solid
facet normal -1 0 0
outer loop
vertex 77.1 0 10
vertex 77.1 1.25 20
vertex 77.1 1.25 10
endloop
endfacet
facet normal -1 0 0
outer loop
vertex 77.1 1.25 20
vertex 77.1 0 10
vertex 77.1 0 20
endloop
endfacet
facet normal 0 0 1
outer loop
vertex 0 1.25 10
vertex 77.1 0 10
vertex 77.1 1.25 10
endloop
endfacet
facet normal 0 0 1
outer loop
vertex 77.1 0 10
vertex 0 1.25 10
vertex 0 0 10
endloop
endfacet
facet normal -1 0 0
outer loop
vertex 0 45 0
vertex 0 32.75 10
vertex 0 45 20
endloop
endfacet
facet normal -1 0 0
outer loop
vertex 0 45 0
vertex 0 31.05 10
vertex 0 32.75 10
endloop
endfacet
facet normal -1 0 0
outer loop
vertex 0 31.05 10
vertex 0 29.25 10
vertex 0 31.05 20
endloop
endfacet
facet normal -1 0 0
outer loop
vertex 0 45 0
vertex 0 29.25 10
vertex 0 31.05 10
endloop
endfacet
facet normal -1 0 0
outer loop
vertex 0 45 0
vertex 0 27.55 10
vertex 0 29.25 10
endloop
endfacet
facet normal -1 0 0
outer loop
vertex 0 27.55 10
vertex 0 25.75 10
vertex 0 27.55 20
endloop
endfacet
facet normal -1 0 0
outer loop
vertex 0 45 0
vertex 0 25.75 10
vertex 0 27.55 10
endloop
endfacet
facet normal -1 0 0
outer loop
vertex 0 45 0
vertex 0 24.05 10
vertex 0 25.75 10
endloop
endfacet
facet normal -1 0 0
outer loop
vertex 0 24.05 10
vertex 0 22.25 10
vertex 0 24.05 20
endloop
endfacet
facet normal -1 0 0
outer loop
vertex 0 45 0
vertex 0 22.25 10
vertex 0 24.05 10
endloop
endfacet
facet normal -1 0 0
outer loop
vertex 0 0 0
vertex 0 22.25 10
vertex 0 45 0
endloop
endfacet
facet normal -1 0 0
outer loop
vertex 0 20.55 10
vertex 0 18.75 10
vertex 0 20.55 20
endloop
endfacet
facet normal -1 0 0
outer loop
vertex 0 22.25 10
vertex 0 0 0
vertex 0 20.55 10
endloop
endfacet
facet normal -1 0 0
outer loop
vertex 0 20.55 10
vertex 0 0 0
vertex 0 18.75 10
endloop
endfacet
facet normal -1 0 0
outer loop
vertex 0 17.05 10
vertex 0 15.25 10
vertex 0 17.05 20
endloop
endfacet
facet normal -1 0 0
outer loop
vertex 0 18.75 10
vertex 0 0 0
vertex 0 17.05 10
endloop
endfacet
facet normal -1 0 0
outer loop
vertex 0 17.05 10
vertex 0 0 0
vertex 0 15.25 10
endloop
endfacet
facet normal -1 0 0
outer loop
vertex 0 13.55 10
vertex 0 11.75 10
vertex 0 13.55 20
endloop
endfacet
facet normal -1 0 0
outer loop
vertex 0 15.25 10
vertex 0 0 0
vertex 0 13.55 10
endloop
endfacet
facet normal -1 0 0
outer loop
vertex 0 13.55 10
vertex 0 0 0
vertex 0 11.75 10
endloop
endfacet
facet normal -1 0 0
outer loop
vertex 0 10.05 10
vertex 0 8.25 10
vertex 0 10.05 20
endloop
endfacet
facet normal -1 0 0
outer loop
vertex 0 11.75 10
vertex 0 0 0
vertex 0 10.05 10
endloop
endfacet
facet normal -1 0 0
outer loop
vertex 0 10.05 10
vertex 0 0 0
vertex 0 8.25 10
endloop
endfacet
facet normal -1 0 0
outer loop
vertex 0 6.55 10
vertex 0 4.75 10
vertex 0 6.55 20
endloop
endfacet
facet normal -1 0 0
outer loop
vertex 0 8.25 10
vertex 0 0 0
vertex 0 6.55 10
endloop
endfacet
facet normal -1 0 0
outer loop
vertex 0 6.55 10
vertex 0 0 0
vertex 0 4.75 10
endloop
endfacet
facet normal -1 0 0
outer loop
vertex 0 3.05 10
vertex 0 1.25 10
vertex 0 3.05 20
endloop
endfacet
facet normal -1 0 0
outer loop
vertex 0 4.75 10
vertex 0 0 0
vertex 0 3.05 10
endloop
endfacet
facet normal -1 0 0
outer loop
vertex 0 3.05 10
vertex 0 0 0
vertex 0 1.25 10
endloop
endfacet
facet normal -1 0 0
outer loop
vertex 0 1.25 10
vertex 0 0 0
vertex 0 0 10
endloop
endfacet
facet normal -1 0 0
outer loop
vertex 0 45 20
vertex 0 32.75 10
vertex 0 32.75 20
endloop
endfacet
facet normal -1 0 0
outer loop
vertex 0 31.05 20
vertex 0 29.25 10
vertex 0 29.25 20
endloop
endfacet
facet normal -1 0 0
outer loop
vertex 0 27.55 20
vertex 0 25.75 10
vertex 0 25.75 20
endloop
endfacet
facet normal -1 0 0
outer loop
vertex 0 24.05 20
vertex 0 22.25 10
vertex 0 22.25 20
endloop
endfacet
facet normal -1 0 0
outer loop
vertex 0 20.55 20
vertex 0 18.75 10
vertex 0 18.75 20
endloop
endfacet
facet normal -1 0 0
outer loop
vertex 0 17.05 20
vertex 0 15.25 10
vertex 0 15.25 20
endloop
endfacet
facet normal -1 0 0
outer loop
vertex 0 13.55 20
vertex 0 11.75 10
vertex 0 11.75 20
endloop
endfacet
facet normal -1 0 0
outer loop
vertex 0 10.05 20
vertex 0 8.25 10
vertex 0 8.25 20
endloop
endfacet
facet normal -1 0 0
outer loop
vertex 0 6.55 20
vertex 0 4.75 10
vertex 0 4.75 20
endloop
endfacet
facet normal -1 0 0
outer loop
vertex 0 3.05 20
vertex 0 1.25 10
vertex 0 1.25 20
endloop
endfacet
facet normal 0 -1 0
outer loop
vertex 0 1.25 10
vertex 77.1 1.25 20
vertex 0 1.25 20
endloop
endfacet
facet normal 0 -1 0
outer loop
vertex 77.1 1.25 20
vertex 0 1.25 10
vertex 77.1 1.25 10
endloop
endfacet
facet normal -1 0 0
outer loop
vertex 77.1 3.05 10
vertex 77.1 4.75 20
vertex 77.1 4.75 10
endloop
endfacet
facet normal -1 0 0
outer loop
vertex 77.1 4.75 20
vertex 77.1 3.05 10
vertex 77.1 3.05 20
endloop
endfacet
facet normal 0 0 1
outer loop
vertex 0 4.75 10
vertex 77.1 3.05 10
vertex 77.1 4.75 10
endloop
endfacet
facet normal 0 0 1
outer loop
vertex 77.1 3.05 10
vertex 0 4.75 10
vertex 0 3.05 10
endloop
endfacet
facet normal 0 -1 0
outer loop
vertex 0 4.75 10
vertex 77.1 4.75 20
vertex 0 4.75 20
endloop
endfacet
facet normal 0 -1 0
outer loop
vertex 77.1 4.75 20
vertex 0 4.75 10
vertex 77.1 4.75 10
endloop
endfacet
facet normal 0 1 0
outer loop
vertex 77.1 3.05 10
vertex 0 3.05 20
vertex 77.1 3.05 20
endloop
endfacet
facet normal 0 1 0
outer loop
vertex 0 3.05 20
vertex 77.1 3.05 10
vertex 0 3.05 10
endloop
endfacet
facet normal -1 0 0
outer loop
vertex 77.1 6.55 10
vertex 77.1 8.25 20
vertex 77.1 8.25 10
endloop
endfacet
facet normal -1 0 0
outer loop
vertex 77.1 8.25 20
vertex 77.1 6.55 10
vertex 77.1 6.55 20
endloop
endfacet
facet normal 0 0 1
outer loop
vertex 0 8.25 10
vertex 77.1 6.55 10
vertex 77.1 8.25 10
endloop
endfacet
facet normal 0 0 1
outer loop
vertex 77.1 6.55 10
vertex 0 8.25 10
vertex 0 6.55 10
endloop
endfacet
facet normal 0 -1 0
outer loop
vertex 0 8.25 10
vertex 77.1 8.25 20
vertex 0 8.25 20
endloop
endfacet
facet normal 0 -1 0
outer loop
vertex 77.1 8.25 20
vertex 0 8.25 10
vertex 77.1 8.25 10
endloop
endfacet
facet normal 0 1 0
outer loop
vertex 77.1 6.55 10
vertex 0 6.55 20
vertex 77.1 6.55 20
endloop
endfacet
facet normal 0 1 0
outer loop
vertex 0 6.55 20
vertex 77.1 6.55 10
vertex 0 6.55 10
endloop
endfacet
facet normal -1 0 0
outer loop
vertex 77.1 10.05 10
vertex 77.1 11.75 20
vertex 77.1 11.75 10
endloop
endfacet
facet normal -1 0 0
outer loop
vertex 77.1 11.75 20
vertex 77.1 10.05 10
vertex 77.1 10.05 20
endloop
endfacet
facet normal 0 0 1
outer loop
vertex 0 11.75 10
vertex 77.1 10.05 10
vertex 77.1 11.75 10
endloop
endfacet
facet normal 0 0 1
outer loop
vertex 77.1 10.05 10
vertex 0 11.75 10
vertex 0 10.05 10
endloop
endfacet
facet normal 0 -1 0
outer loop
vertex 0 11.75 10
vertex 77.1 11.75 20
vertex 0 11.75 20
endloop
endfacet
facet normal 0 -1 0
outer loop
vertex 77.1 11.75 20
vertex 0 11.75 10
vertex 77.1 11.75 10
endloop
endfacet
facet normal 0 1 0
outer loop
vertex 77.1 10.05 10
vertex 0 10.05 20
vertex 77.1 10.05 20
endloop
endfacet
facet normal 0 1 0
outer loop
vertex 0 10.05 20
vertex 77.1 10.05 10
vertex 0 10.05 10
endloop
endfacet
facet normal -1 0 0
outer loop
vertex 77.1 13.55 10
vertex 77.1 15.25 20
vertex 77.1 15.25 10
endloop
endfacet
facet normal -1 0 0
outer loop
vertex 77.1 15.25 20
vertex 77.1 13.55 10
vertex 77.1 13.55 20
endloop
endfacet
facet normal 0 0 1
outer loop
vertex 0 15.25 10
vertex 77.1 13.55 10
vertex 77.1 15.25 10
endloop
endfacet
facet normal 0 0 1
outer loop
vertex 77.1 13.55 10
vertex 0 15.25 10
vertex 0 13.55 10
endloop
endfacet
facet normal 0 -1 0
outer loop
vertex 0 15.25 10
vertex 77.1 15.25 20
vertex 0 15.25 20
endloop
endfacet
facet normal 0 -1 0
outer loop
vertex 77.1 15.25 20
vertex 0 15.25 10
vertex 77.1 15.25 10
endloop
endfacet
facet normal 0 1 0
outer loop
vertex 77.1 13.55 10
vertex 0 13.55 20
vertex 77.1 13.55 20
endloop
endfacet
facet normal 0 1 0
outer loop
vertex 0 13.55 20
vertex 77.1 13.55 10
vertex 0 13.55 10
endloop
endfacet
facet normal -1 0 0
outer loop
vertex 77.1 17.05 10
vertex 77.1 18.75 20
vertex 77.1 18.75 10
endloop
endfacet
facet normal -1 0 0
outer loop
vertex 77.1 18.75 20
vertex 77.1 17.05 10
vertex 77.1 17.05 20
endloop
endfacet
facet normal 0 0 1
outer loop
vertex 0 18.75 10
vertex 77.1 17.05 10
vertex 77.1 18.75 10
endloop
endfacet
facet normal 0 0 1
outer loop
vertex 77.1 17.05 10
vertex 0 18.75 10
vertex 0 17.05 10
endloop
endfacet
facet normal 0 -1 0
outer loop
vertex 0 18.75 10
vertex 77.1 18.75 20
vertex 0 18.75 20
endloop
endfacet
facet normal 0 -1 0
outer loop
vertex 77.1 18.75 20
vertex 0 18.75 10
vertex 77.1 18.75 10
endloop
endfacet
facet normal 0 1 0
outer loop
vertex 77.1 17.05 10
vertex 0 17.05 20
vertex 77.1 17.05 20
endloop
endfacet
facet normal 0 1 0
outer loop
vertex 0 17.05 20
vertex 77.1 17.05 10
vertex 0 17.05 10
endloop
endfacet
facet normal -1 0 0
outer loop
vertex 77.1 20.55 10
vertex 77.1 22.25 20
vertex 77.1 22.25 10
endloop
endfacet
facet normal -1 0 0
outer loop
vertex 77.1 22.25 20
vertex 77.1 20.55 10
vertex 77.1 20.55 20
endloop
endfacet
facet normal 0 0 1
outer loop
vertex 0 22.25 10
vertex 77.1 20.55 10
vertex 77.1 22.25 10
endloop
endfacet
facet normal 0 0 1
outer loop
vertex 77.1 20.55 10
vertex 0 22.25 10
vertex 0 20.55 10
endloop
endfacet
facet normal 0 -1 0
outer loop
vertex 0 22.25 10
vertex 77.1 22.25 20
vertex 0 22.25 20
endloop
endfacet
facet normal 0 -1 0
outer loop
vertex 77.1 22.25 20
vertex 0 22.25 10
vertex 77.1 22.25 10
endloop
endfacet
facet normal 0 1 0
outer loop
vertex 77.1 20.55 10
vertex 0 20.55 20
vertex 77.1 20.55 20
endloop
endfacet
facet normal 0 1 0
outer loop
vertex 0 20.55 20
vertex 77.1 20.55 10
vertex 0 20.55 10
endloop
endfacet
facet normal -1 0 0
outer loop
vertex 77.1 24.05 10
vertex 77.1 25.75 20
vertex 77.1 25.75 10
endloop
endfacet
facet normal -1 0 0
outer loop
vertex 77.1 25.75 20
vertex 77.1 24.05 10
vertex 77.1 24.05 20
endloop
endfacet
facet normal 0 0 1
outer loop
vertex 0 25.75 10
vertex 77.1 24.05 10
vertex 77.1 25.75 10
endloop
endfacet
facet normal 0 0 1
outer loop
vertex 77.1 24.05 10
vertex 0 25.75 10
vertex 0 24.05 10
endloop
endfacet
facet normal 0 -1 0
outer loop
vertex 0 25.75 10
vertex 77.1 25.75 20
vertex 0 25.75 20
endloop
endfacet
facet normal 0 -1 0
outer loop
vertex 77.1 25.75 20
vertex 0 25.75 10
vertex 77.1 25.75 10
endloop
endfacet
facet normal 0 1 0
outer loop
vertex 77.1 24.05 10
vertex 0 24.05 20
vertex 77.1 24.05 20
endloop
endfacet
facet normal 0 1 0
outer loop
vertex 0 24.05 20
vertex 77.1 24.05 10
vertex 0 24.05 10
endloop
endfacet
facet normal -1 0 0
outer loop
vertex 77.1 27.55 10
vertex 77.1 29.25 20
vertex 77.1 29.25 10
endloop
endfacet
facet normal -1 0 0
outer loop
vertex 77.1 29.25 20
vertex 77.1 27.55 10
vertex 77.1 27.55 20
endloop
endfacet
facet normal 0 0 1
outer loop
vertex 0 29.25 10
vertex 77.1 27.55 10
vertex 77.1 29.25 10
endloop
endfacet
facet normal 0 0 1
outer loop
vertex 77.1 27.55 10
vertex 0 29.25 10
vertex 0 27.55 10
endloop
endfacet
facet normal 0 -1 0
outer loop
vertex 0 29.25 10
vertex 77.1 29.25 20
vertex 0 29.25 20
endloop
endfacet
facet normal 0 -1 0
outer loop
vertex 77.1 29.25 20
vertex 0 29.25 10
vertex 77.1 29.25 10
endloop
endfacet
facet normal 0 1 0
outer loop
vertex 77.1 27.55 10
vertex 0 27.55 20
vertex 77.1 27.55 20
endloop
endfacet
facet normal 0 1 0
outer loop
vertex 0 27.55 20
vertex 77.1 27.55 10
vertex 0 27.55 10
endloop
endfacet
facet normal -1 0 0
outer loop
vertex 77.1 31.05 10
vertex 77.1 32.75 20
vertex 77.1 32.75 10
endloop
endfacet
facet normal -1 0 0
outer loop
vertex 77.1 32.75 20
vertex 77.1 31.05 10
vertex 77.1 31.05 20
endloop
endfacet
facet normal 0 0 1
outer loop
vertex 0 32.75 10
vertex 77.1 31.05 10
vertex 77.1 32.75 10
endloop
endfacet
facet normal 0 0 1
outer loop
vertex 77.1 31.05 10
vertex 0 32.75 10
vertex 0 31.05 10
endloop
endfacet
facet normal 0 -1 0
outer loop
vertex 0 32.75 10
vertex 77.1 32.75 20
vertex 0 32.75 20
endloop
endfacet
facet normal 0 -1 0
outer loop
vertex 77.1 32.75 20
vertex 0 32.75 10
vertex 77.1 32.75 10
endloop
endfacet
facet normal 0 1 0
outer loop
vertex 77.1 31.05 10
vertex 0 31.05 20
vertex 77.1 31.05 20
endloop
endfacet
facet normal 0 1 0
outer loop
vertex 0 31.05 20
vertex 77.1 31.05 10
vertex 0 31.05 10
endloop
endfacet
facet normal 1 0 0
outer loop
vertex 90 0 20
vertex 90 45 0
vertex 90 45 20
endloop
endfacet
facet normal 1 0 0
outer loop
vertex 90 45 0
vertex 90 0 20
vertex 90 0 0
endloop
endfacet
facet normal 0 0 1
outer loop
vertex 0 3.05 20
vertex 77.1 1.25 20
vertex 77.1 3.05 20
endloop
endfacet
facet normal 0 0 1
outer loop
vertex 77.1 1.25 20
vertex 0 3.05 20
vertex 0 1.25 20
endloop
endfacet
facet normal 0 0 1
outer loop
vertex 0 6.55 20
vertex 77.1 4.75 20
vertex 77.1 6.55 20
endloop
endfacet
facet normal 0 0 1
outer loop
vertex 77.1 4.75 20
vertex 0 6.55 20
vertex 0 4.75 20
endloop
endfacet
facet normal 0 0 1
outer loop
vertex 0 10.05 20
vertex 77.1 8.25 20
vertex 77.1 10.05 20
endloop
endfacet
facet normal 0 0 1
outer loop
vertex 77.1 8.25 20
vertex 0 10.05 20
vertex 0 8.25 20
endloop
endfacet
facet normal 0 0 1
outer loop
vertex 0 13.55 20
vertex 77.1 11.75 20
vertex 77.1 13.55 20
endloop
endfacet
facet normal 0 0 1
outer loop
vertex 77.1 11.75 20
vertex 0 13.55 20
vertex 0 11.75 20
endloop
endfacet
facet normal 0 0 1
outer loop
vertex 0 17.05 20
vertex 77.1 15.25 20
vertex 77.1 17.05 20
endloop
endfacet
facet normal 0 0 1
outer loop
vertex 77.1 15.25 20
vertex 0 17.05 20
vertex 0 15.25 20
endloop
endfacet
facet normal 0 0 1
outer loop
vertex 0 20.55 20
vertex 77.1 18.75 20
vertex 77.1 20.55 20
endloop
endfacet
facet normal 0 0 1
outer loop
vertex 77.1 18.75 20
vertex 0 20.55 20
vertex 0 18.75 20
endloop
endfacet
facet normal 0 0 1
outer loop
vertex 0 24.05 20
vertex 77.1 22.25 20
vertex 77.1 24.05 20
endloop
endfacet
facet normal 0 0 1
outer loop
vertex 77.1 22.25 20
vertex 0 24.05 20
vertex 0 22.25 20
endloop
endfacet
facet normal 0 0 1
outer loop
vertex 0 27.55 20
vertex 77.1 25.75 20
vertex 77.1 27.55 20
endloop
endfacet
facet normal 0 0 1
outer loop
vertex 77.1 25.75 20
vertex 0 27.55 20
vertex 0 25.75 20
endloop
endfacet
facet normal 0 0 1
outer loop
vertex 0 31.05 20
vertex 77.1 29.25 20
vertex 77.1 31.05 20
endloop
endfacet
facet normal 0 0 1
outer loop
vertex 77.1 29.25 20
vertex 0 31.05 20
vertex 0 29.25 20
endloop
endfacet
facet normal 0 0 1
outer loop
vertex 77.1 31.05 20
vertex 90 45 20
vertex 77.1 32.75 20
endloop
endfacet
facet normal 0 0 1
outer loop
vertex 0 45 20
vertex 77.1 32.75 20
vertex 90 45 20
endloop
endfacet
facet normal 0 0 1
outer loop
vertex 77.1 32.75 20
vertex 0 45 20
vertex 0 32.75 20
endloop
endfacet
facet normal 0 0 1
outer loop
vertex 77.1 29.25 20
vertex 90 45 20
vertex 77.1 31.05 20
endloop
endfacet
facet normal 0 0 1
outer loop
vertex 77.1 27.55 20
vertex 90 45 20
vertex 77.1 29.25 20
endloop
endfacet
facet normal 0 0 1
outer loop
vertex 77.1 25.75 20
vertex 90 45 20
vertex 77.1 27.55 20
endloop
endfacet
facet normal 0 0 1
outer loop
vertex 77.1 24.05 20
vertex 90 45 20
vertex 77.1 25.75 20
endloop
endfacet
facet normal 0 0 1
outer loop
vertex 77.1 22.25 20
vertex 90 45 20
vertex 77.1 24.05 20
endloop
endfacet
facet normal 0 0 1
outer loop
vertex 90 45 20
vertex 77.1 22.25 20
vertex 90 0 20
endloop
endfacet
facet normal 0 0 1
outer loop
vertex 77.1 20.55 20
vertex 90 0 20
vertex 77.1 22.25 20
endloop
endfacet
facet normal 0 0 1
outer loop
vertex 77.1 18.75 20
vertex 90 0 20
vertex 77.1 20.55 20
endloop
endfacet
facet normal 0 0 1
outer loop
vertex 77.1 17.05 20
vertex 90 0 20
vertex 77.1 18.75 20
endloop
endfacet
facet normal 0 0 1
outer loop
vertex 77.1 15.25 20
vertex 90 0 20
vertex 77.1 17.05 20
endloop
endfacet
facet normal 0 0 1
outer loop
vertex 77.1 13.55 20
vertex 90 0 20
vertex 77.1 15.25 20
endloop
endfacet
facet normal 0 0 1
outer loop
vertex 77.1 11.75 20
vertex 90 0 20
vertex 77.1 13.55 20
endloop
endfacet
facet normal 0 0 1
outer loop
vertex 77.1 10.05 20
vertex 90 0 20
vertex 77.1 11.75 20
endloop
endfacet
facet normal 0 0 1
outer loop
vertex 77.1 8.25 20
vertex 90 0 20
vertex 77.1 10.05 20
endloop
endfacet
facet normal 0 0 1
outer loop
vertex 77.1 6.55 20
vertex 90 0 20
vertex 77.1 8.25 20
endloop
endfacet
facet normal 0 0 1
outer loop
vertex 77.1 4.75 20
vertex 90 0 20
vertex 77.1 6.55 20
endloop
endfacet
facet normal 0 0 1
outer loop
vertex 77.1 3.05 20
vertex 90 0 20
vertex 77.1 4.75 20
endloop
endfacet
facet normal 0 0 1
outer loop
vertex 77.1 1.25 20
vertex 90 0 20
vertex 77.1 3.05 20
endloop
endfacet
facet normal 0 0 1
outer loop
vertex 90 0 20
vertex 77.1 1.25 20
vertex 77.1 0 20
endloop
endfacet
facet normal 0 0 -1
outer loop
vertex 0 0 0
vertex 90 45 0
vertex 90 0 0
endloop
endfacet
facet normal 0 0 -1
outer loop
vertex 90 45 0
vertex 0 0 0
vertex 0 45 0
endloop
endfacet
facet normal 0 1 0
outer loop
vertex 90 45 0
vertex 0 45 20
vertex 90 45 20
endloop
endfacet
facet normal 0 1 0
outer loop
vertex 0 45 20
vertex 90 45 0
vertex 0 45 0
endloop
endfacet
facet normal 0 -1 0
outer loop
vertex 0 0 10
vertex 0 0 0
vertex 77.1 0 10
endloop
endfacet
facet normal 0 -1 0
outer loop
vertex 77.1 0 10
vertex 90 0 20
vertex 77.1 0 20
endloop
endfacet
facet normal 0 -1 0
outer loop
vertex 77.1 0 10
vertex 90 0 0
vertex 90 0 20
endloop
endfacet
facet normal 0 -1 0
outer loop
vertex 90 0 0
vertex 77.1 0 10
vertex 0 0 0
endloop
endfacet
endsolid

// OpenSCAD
// Drying Rack for 10 Microscope Slides
// Base: 90 x 45 x 20 mm
// Slots: 10 parallel slots along X, 77mm long, 1.6mm wide, 10mm deep
// Spacing: 3.5mm centre-to-centre in Y, centred on block

$fn = 128;

// Base Dimensions
base_length = 90;
base_width = 45;
base_height = 20;

// Slide Dimensions (for reference)
slide_length = 75;
slide_width = 25;
slide_thickness = 1;

// Slot Dimensions
slot_length = 77;
slot_width = 1.6;
slot_depth = 10;

// Layout Dimensions
slot_spacing = 3.5; // Centre-to-centre in Y
num_slots = 10;

// Calculate Y position of the first slot centre
// Total width of slots = num_slots * slot_width
// Total width of gaps = (num_slots - 1) * slot_spacing
// Remaining space to distribute on both sides = (base_width - total_slots - total_gaps) / 2
total_slot_width = num_slots * slot_width;
total_gap_width = (num_slots - 1) * slot_spacing;
offset_from_edge = (base_width - total_slot_width - total_gap_width) / 2;
first_slot_y = offset_from_edge + slot_width / 2;

// Build the solid block
difference() {
    // Main Block
    cube([base_length, base_width, base_height], center = false);
    
    // Cut Slots
    // Slots run along X, so we cut from the top face (Z = base_height) down to Z = base_height - slot_depth
    // We use a loop to generate the 10 slots
    for (i = [0 : num_slots - 1]) {
        // Calculate Y position for current slot
        y_pos = first_slot_y + (i * slot_spacing);
        
        // Define the slot geometry
        // The slot is a rectangular prism cut into the top
        translate([
            0,              // X position (runs full length, centred)
            y_pos,          // Y position
            base_height - slot_depth // Z position: Start at top surface, extend down
        ]) {
            // Cut a block that is slightly larger than the slot to ensure clean cut
            // Extending 0.1mm past the faces as per rules
            cube([
                slot_length + 0.1,
                slot_width + 0.1,
                slot_depth + 0.1
            ]);
        }
    }
}
